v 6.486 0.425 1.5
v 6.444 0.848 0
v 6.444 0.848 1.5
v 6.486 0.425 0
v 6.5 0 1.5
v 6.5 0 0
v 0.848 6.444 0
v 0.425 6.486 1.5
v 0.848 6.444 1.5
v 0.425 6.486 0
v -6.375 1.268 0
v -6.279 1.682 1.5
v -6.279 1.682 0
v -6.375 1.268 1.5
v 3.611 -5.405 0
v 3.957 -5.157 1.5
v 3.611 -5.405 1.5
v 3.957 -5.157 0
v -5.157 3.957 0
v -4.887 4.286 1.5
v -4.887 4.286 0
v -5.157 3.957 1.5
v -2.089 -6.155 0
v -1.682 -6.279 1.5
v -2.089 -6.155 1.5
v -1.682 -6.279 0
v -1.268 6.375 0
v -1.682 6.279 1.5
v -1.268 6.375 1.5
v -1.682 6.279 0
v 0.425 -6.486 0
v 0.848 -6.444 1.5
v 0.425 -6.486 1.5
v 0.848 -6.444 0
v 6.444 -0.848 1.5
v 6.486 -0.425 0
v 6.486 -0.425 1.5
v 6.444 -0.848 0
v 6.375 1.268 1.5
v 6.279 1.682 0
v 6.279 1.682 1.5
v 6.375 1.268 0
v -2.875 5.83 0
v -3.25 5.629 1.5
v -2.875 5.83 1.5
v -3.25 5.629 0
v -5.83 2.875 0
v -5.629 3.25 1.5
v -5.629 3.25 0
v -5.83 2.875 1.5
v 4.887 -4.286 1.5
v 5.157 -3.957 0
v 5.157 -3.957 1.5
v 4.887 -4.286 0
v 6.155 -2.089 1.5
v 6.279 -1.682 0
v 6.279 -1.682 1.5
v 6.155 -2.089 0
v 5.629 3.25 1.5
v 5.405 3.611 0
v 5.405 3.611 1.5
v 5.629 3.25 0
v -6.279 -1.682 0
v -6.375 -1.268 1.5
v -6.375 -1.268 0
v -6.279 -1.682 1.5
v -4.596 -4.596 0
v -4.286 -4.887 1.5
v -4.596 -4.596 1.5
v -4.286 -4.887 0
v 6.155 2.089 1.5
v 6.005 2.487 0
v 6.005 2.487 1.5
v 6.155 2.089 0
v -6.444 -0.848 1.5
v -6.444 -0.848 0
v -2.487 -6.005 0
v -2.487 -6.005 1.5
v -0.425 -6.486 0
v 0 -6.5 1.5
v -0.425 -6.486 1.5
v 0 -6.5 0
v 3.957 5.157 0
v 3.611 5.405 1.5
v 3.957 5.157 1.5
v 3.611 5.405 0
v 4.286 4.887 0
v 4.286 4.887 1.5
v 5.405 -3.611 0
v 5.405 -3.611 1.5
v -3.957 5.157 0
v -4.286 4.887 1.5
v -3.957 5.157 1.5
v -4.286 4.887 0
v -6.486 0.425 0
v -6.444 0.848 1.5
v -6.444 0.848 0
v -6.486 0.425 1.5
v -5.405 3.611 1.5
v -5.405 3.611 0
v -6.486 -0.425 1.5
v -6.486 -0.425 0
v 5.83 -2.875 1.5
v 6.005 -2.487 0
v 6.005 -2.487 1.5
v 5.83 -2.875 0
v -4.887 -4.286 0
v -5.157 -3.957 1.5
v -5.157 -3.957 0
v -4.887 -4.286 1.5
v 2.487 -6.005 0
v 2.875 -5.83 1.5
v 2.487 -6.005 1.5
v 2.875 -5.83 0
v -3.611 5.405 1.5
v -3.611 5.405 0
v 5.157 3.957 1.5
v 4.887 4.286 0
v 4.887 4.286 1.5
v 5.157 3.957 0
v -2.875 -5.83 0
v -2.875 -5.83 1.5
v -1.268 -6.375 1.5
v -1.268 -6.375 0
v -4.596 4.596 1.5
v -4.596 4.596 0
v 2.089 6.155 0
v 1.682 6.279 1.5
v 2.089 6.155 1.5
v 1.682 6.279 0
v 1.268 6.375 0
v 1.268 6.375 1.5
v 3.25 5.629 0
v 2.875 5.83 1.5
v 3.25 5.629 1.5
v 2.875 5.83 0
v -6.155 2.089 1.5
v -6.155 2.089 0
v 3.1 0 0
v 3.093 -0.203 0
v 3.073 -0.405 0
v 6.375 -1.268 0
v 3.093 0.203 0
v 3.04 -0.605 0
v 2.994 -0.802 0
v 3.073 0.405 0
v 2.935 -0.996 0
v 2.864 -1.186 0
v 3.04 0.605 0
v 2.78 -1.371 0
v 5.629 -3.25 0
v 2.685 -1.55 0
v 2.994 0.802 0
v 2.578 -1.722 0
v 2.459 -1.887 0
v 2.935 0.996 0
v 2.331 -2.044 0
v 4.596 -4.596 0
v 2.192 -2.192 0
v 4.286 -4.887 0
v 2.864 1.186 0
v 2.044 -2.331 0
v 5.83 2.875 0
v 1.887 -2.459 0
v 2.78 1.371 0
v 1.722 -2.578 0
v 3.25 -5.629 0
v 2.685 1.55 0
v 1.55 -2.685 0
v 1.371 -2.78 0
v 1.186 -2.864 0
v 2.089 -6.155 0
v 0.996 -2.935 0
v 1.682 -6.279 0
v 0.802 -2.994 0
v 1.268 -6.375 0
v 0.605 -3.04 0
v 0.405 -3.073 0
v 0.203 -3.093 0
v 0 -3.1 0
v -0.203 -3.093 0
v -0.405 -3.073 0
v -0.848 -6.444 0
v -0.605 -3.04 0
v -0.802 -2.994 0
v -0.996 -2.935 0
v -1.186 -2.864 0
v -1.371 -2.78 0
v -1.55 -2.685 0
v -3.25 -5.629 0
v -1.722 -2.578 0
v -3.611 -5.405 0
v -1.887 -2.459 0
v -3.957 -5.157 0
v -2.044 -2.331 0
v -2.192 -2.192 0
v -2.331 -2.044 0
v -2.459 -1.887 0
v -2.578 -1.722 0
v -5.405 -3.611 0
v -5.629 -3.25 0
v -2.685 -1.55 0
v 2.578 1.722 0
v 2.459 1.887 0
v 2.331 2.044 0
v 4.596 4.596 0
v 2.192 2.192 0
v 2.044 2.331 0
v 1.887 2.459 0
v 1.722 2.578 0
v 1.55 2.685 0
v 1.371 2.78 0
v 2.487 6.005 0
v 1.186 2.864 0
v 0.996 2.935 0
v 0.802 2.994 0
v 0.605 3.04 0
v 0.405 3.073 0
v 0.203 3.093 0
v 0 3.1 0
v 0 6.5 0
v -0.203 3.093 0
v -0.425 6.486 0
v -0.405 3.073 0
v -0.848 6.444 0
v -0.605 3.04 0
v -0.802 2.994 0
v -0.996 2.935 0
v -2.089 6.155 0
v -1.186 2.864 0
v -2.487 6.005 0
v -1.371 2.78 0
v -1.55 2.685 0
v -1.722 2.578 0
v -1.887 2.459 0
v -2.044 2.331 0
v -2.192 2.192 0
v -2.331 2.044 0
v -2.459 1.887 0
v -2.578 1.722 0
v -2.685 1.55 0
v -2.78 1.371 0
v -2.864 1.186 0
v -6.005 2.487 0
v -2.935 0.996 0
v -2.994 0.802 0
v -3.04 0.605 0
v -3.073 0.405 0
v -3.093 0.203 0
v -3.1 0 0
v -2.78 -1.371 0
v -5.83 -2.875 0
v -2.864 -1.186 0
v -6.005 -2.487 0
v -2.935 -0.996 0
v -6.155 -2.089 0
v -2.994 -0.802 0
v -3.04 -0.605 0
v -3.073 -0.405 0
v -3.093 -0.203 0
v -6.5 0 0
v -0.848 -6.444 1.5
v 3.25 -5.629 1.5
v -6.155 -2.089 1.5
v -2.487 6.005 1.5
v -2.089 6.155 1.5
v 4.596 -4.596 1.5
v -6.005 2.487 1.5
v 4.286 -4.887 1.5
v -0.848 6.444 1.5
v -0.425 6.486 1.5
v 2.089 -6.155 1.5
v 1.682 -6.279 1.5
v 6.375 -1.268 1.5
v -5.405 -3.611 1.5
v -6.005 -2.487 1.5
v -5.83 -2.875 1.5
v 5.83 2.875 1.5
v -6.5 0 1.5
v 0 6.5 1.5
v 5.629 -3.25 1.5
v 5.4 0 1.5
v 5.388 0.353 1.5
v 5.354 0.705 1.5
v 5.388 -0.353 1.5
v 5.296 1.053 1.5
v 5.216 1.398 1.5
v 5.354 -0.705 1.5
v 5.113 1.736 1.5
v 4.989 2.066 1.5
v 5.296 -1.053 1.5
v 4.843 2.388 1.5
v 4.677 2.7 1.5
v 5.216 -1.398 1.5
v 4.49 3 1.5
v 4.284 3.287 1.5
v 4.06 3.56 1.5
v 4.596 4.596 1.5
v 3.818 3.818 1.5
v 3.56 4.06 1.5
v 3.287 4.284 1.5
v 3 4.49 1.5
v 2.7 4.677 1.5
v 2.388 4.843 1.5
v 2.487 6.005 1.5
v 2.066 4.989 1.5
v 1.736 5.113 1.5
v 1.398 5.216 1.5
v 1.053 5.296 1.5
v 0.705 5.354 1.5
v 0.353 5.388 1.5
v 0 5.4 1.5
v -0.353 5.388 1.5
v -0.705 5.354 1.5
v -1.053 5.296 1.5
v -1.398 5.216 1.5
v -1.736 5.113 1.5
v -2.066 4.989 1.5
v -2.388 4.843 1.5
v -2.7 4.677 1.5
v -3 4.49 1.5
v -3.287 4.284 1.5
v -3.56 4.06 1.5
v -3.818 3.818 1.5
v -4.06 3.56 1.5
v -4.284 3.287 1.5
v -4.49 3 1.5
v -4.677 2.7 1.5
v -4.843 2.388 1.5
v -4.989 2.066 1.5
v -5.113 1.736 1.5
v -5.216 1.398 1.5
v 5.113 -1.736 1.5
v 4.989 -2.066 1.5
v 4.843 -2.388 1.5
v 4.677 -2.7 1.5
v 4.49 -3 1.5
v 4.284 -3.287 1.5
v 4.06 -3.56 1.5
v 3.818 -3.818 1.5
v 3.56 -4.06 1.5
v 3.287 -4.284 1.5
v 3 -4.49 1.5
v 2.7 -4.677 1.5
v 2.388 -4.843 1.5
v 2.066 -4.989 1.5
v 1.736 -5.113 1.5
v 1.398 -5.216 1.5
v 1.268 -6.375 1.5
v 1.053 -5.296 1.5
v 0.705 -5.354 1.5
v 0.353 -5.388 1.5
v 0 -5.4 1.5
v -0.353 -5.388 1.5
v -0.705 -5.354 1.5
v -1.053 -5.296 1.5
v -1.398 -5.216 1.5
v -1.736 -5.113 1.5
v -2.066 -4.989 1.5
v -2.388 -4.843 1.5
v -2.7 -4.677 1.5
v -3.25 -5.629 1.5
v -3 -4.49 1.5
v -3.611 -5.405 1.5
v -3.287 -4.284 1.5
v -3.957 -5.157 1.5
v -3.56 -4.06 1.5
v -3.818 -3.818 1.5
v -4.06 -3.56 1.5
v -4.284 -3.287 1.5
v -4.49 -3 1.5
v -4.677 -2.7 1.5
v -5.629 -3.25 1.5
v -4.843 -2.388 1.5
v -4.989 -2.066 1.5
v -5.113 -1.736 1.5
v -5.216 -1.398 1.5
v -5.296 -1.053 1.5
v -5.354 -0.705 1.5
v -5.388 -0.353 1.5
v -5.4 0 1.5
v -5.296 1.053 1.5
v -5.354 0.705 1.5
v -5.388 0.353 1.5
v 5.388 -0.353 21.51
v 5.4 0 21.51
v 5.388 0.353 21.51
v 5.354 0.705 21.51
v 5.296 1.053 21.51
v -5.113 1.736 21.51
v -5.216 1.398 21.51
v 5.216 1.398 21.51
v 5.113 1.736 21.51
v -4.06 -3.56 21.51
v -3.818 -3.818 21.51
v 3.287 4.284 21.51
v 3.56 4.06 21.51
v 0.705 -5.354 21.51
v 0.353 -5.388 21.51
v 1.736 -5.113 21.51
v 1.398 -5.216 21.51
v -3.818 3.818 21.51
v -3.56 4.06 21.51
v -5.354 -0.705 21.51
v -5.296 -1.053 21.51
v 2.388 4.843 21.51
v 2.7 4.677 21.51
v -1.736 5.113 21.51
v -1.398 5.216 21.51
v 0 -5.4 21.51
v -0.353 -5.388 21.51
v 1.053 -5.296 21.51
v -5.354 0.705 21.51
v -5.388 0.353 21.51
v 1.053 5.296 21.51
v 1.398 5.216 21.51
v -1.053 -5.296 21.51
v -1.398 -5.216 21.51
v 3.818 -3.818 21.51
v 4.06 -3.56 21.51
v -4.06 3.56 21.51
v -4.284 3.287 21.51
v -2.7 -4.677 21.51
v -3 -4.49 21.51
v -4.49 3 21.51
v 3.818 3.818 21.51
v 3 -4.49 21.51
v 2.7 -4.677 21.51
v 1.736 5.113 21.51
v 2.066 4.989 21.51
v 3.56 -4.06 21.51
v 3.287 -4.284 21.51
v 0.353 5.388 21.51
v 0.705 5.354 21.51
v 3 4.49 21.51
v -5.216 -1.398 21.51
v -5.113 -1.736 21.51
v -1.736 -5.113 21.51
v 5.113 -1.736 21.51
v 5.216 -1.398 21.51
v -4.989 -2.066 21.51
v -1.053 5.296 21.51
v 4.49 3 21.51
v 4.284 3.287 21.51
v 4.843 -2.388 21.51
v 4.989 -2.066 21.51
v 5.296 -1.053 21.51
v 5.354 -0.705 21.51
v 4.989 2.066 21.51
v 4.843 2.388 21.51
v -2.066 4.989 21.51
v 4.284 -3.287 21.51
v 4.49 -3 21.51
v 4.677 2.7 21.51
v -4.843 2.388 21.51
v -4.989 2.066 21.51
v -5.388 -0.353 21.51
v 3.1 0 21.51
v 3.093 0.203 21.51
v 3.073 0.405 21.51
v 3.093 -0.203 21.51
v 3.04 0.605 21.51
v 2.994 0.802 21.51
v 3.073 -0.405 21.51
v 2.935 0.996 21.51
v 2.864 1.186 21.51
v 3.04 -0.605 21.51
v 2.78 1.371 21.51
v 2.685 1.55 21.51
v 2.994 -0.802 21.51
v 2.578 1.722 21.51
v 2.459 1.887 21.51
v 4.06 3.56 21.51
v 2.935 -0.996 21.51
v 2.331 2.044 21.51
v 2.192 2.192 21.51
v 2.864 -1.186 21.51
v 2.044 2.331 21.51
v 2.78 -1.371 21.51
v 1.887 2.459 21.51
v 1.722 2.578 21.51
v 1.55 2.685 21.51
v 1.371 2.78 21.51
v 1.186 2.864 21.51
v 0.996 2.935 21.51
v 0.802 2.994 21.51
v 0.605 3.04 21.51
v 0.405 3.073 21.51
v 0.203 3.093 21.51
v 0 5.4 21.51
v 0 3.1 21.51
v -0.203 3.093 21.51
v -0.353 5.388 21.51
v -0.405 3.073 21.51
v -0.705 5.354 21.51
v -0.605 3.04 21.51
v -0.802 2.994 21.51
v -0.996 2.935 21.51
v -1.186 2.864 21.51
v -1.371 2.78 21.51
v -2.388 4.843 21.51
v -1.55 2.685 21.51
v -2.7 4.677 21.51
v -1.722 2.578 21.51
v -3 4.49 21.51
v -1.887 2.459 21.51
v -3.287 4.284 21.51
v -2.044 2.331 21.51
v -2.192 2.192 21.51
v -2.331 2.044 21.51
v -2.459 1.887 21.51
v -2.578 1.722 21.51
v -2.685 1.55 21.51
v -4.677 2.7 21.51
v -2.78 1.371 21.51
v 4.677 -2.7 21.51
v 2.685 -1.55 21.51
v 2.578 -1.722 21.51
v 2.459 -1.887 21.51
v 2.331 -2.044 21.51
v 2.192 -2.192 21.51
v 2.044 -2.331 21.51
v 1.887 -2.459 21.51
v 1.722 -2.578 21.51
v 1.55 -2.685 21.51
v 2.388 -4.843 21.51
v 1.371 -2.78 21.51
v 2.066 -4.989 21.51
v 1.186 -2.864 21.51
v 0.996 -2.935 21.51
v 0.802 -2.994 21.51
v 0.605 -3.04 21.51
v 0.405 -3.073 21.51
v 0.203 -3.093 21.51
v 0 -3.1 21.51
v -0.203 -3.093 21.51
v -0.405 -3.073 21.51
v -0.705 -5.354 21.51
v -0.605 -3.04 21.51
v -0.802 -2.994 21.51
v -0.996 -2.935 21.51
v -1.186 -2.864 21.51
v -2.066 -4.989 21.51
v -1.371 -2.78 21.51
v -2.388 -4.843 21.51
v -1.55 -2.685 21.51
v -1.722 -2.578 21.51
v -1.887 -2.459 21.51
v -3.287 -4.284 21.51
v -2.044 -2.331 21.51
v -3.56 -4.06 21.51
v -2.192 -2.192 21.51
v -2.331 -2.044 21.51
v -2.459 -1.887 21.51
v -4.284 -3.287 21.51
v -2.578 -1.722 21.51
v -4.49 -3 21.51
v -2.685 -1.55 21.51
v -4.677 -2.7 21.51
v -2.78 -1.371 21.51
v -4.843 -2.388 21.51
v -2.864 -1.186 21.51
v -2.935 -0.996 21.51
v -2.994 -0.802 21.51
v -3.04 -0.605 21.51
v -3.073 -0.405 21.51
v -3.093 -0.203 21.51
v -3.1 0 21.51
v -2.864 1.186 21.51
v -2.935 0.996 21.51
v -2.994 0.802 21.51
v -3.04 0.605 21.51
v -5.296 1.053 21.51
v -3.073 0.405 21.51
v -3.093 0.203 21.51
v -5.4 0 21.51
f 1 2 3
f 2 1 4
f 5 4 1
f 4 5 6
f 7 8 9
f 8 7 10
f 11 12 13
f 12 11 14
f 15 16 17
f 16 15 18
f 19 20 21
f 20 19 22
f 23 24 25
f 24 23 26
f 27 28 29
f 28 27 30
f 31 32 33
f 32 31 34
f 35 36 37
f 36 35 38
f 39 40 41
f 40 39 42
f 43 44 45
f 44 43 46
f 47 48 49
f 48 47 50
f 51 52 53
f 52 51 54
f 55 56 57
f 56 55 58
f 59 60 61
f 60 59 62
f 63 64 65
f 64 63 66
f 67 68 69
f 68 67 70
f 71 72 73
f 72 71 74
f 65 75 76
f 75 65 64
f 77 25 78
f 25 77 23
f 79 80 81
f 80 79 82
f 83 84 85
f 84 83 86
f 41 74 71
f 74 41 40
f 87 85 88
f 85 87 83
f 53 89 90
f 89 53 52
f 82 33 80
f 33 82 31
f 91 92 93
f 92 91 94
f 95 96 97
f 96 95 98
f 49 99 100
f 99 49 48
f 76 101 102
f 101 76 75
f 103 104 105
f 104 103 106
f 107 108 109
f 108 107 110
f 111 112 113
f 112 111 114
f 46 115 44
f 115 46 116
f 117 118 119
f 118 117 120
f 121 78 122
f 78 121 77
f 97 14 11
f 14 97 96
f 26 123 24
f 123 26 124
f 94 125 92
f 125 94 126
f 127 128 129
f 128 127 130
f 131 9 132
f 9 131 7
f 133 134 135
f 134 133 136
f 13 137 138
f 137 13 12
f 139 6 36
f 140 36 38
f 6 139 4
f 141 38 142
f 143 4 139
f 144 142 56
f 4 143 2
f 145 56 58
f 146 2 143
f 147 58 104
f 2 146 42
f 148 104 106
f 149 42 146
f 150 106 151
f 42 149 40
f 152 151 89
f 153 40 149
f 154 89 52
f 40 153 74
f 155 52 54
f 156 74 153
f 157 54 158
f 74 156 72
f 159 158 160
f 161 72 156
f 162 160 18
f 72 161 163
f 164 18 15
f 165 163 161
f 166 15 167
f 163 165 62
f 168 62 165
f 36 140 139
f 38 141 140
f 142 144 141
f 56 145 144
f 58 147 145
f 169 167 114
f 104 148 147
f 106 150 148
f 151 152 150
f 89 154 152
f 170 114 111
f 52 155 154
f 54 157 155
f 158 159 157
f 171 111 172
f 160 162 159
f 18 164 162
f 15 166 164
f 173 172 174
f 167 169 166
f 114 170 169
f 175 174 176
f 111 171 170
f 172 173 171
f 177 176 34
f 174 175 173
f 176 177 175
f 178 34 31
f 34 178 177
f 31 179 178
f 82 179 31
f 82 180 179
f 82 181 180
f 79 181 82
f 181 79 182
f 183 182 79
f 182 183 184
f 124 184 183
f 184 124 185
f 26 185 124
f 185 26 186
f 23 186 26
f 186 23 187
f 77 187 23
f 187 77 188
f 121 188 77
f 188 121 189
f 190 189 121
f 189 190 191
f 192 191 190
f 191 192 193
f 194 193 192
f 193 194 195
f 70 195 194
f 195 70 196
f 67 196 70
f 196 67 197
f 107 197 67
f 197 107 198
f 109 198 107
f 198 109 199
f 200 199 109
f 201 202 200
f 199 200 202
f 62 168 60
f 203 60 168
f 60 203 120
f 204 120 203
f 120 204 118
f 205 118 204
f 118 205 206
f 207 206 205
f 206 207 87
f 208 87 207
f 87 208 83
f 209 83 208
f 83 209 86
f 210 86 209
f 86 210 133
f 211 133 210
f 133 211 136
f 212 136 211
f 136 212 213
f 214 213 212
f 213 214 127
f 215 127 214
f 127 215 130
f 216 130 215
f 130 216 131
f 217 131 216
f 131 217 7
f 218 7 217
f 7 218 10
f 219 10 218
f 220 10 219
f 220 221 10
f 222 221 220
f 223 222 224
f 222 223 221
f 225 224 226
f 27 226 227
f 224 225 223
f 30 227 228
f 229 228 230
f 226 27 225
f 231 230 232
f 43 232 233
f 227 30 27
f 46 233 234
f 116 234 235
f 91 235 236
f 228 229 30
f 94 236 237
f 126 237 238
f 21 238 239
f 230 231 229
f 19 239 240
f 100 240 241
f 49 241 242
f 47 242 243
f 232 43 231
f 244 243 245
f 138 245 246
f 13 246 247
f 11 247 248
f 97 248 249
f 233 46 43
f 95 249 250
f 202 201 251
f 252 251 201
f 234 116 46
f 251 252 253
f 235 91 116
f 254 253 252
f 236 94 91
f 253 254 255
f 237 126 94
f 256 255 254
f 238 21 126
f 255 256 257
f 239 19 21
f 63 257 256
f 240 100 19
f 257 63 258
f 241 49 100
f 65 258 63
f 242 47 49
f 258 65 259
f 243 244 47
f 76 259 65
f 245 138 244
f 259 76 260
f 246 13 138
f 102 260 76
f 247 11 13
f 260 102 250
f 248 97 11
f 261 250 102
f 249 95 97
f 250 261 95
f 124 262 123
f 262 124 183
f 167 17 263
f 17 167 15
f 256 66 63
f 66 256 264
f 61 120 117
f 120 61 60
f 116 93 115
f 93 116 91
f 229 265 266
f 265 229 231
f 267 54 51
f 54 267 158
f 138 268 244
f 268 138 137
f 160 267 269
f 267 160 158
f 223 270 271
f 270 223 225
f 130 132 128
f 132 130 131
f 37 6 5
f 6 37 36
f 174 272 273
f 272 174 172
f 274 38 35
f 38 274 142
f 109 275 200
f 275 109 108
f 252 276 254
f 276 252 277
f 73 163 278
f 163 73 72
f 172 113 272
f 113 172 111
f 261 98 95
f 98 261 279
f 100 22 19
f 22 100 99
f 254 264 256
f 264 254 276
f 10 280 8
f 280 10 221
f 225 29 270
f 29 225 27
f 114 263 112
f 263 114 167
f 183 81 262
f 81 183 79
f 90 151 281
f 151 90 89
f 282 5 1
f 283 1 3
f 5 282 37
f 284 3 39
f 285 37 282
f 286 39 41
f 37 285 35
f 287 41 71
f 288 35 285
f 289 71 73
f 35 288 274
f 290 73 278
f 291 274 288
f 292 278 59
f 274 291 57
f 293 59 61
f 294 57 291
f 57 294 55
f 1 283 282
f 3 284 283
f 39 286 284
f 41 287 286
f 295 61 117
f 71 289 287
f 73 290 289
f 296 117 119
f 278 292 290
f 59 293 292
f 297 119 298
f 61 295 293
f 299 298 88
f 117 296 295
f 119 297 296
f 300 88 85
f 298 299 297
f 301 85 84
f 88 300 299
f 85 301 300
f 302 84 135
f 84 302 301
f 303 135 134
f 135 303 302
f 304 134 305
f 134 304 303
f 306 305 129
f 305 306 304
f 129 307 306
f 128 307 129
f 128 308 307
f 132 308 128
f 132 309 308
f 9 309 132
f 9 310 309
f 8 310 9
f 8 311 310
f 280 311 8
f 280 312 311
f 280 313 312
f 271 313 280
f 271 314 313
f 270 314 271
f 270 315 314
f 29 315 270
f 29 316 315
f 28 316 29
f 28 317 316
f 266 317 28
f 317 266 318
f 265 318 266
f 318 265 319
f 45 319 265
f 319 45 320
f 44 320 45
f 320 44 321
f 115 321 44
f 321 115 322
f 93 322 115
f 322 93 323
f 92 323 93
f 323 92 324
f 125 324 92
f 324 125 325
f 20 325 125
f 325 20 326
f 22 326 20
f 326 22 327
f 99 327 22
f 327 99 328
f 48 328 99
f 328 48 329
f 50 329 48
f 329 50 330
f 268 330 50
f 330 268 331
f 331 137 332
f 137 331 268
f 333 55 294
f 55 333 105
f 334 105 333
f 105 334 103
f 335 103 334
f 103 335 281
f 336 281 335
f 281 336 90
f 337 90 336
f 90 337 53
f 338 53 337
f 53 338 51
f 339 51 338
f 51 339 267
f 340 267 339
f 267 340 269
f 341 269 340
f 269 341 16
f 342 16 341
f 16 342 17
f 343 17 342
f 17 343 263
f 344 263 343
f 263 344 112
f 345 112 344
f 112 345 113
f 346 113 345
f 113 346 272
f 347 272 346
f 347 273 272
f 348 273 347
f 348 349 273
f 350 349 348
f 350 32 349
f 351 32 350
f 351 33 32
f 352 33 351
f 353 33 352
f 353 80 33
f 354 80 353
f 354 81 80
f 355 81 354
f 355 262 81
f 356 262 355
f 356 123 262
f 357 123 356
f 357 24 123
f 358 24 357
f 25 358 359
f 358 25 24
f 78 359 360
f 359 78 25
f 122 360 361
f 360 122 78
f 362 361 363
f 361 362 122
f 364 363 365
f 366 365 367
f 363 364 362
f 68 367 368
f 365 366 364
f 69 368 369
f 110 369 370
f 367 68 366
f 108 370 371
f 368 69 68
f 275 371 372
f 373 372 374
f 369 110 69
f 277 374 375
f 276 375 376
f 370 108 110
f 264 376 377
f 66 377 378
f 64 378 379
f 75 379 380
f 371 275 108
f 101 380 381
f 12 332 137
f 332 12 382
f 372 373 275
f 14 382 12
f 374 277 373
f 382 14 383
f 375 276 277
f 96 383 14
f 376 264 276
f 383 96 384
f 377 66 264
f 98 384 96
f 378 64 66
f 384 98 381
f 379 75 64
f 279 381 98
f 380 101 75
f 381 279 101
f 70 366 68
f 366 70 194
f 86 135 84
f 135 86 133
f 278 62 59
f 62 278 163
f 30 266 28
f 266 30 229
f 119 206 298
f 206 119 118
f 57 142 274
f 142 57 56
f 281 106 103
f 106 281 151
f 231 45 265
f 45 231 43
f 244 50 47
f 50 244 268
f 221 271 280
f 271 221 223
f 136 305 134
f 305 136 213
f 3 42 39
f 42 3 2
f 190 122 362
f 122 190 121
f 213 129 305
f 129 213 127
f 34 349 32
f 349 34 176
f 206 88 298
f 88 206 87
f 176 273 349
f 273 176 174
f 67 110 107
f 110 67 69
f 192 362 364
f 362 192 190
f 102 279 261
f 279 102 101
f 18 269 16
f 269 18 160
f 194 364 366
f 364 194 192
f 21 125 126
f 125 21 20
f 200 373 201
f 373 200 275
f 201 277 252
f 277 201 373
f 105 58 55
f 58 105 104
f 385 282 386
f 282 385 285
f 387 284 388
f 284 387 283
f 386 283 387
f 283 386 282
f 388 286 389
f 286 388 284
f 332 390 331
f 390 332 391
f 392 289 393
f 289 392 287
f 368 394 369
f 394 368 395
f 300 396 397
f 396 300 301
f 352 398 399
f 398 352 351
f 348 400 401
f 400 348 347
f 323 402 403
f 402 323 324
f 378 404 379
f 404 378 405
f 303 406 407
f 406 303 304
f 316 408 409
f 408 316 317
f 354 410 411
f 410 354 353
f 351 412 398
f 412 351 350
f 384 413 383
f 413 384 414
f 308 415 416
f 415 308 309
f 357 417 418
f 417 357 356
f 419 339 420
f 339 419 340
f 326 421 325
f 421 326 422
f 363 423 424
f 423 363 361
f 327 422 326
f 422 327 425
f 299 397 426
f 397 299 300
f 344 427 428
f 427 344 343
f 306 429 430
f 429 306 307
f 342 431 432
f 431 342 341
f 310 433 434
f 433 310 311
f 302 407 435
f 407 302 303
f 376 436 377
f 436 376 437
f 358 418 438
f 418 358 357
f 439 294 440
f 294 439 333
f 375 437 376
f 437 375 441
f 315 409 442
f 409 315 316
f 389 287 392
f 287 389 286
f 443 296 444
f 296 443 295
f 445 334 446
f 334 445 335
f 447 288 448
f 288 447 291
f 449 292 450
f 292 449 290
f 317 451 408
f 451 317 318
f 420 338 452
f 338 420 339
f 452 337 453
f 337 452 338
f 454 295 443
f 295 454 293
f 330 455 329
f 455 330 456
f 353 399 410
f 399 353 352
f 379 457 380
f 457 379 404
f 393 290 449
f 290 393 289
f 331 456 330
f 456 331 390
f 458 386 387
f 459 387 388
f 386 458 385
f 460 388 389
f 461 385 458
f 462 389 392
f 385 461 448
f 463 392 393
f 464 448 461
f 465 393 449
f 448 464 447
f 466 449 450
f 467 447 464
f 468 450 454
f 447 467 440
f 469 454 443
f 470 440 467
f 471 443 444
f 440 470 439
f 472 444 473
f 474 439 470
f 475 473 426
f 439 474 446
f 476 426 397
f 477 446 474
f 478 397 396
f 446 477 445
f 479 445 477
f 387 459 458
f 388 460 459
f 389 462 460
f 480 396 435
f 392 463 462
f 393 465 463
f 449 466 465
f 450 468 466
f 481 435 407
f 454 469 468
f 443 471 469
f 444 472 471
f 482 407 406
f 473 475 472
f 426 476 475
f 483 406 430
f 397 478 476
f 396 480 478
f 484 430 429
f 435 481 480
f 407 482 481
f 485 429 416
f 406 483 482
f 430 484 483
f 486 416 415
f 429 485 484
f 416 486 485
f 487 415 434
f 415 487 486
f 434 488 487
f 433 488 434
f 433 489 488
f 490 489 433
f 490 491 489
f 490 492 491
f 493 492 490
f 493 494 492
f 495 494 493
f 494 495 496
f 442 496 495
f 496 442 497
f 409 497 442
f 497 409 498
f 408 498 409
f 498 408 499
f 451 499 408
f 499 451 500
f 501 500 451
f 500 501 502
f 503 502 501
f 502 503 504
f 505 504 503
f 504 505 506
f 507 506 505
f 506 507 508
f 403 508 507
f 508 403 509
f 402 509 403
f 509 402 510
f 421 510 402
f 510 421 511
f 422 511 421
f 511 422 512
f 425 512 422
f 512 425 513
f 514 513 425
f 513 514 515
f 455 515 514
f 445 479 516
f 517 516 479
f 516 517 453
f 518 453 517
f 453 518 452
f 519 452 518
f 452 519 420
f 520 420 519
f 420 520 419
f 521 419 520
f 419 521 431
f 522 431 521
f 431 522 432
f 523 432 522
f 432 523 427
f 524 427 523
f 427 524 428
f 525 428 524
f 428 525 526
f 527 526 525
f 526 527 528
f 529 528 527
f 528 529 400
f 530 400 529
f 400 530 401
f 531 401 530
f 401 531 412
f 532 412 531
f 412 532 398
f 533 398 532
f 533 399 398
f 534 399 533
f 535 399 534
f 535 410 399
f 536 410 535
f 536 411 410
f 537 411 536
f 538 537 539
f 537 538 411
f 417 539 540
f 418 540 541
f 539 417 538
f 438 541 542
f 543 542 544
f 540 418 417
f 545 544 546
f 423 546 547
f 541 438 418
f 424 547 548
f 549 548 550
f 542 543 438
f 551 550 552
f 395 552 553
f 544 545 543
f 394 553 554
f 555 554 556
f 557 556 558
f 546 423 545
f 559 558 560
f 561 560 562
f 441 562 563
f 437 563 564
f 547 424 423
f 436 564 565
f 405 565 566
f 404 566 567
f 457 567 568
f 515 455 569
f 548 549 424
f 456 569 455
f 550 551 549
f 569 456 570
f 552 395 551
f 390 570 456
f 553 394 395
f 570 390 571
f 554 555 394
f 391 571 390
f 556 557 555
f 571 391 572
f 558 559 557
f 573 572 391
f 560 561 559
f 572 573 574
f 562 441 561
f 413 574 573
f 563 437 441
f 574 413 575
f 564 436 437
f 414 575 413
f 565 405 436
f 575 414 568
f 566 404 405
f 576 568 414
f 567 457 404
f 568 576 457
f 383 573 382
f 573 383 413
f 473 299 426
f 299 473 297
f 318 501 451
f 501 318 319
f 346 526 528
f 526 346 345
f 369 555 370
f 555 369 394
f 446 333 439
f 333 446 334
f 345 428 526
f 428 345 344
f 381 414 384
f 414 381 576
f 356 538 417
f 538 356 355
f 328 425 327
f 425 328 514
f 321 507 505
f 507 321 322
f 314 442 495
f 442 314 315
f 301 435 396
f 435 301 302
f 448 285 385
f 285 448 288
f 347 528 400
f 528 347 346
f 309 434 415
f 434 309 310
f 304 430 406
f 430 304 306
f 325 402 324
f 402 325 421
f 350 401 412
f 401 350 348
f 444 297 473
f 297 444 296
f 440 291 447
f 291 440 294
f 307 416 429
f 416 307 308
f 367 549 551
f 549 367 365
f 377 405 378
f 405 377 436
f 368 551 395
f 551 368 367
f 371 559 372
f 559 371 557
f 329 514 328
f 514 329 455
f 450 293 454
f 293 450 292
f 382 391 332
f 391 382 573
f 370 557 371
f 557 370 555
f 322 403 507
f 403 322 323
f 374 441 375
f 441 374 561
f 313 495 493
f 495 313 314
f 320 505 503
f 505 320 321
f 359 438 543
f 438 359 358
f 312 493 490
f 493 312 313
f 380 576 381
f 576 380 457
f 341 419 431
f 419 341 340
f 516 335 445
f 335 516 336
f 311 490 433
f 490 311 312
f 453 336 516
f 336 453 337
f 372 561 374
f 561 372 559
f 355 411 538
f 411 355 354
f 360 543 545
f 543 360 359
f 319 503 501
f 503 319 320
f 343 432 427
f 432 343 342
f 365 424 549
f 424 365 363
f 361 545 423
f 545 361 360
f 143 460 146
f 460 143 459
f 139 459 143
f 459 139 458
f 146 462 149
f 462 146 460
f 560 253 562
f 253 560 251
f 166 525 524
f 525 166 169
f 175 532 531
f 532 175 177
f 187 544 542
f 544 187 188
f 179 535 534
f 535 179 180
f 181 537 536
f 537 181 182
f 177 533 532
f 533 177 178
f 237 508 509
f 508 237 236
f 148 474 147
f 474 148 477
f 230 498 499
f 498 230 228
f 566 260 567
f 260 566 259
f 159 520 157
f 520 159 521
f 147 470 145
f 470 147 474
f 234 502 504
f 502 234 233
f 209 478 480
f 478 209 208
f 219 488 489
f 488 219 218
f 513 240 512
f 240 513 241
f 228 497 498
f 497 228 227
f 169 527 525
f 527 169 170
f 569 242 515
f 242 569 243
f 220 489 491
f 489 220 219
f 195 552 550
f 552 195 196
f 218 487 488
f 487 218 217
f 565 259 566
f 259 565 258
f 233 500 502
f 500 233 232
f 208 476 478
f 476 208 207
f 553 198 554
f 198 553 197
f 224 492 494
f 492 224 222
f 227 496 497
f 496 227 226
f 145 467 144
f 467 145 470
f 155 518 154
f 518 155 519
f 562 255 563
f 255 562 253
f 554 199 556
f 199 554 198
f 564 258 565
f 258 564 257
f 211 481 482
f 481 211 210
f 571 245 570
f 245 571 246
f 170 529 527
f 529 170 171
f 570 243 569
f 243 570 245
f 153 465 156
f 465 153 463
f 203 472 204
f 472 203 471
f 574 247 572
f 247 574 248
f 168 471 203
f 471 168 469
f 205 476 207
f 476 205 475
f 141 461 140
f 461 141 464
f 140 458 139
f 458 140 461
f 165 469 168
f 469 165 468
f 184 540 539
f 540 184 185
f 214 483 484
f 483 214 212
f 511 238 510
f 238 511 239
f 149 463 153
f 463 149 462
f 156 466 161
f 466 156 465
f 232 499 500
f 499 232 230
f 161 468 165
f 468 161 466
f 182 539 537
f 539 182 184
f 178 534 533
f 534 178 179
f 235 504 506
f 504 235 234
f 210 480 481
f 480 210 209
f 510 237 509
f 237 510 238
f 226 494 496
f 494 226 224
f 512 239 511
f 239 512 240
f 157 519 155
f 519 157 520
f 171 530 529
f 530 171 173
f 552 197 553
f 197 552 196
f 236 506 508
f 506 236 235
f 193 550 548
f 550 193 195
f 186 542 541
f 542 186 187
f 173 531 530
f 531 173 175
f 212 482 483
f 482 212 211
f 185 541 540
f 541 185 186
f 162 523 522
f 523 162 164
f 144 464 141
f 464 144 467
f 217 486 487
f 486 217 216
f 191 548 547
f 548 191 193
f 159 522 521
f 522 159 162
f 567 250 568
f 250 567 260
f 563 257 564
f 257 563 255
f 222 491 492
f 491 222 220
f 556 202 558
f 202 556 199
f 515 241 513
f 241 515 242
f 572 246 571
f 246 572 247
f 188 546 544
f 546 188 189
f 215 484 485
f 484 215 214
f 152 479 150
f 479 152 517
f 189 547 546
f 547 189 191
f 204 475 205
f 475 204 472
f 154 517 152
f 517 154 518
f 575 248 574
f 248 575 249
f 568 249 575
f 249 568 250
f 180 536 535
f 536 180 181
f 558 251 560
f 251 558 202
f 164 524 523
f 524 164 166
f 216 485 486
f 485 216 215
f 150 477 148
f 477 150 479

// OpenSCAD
// Adapter sleeve: 0.2 mL PCR tube in a 1.5 mL tube rack hole
// Print orientation: collar on bed (z = 0), sleeve body builds upward

// ---- Dimensions (mm) ----
collar_d        = 13;     // collar outer diameter
collar_t        = 1.5;    // collar thickness (z = 0 to 1.5)
sleeve_d        = 10.8;   // sleeve body outer diameter
sleeve_h        = 20;     // sleeve body height (z = 1.5 to 21.5)
bore_d          = 6.2;    // through-bore diameter
eps             = 0.5;    // cutter overshoot past faces

$fn = 96;

difference() {
    union() {
        // Collar
        cylinder(d = collar_d, h = collar_t);
        // Sleeve body (slightly overlapping the collar for a clean union)
        translate([0, 0, collar_t - 0.01])
            cylinder(d = sleeve_d, h = sleeve_h + 0.02);
    }
    // Through bore
    translate([0, 0, -eps])
        cylinder(d = bore_d, h = sleeve_h + collar_t + 2 * eps);
}
